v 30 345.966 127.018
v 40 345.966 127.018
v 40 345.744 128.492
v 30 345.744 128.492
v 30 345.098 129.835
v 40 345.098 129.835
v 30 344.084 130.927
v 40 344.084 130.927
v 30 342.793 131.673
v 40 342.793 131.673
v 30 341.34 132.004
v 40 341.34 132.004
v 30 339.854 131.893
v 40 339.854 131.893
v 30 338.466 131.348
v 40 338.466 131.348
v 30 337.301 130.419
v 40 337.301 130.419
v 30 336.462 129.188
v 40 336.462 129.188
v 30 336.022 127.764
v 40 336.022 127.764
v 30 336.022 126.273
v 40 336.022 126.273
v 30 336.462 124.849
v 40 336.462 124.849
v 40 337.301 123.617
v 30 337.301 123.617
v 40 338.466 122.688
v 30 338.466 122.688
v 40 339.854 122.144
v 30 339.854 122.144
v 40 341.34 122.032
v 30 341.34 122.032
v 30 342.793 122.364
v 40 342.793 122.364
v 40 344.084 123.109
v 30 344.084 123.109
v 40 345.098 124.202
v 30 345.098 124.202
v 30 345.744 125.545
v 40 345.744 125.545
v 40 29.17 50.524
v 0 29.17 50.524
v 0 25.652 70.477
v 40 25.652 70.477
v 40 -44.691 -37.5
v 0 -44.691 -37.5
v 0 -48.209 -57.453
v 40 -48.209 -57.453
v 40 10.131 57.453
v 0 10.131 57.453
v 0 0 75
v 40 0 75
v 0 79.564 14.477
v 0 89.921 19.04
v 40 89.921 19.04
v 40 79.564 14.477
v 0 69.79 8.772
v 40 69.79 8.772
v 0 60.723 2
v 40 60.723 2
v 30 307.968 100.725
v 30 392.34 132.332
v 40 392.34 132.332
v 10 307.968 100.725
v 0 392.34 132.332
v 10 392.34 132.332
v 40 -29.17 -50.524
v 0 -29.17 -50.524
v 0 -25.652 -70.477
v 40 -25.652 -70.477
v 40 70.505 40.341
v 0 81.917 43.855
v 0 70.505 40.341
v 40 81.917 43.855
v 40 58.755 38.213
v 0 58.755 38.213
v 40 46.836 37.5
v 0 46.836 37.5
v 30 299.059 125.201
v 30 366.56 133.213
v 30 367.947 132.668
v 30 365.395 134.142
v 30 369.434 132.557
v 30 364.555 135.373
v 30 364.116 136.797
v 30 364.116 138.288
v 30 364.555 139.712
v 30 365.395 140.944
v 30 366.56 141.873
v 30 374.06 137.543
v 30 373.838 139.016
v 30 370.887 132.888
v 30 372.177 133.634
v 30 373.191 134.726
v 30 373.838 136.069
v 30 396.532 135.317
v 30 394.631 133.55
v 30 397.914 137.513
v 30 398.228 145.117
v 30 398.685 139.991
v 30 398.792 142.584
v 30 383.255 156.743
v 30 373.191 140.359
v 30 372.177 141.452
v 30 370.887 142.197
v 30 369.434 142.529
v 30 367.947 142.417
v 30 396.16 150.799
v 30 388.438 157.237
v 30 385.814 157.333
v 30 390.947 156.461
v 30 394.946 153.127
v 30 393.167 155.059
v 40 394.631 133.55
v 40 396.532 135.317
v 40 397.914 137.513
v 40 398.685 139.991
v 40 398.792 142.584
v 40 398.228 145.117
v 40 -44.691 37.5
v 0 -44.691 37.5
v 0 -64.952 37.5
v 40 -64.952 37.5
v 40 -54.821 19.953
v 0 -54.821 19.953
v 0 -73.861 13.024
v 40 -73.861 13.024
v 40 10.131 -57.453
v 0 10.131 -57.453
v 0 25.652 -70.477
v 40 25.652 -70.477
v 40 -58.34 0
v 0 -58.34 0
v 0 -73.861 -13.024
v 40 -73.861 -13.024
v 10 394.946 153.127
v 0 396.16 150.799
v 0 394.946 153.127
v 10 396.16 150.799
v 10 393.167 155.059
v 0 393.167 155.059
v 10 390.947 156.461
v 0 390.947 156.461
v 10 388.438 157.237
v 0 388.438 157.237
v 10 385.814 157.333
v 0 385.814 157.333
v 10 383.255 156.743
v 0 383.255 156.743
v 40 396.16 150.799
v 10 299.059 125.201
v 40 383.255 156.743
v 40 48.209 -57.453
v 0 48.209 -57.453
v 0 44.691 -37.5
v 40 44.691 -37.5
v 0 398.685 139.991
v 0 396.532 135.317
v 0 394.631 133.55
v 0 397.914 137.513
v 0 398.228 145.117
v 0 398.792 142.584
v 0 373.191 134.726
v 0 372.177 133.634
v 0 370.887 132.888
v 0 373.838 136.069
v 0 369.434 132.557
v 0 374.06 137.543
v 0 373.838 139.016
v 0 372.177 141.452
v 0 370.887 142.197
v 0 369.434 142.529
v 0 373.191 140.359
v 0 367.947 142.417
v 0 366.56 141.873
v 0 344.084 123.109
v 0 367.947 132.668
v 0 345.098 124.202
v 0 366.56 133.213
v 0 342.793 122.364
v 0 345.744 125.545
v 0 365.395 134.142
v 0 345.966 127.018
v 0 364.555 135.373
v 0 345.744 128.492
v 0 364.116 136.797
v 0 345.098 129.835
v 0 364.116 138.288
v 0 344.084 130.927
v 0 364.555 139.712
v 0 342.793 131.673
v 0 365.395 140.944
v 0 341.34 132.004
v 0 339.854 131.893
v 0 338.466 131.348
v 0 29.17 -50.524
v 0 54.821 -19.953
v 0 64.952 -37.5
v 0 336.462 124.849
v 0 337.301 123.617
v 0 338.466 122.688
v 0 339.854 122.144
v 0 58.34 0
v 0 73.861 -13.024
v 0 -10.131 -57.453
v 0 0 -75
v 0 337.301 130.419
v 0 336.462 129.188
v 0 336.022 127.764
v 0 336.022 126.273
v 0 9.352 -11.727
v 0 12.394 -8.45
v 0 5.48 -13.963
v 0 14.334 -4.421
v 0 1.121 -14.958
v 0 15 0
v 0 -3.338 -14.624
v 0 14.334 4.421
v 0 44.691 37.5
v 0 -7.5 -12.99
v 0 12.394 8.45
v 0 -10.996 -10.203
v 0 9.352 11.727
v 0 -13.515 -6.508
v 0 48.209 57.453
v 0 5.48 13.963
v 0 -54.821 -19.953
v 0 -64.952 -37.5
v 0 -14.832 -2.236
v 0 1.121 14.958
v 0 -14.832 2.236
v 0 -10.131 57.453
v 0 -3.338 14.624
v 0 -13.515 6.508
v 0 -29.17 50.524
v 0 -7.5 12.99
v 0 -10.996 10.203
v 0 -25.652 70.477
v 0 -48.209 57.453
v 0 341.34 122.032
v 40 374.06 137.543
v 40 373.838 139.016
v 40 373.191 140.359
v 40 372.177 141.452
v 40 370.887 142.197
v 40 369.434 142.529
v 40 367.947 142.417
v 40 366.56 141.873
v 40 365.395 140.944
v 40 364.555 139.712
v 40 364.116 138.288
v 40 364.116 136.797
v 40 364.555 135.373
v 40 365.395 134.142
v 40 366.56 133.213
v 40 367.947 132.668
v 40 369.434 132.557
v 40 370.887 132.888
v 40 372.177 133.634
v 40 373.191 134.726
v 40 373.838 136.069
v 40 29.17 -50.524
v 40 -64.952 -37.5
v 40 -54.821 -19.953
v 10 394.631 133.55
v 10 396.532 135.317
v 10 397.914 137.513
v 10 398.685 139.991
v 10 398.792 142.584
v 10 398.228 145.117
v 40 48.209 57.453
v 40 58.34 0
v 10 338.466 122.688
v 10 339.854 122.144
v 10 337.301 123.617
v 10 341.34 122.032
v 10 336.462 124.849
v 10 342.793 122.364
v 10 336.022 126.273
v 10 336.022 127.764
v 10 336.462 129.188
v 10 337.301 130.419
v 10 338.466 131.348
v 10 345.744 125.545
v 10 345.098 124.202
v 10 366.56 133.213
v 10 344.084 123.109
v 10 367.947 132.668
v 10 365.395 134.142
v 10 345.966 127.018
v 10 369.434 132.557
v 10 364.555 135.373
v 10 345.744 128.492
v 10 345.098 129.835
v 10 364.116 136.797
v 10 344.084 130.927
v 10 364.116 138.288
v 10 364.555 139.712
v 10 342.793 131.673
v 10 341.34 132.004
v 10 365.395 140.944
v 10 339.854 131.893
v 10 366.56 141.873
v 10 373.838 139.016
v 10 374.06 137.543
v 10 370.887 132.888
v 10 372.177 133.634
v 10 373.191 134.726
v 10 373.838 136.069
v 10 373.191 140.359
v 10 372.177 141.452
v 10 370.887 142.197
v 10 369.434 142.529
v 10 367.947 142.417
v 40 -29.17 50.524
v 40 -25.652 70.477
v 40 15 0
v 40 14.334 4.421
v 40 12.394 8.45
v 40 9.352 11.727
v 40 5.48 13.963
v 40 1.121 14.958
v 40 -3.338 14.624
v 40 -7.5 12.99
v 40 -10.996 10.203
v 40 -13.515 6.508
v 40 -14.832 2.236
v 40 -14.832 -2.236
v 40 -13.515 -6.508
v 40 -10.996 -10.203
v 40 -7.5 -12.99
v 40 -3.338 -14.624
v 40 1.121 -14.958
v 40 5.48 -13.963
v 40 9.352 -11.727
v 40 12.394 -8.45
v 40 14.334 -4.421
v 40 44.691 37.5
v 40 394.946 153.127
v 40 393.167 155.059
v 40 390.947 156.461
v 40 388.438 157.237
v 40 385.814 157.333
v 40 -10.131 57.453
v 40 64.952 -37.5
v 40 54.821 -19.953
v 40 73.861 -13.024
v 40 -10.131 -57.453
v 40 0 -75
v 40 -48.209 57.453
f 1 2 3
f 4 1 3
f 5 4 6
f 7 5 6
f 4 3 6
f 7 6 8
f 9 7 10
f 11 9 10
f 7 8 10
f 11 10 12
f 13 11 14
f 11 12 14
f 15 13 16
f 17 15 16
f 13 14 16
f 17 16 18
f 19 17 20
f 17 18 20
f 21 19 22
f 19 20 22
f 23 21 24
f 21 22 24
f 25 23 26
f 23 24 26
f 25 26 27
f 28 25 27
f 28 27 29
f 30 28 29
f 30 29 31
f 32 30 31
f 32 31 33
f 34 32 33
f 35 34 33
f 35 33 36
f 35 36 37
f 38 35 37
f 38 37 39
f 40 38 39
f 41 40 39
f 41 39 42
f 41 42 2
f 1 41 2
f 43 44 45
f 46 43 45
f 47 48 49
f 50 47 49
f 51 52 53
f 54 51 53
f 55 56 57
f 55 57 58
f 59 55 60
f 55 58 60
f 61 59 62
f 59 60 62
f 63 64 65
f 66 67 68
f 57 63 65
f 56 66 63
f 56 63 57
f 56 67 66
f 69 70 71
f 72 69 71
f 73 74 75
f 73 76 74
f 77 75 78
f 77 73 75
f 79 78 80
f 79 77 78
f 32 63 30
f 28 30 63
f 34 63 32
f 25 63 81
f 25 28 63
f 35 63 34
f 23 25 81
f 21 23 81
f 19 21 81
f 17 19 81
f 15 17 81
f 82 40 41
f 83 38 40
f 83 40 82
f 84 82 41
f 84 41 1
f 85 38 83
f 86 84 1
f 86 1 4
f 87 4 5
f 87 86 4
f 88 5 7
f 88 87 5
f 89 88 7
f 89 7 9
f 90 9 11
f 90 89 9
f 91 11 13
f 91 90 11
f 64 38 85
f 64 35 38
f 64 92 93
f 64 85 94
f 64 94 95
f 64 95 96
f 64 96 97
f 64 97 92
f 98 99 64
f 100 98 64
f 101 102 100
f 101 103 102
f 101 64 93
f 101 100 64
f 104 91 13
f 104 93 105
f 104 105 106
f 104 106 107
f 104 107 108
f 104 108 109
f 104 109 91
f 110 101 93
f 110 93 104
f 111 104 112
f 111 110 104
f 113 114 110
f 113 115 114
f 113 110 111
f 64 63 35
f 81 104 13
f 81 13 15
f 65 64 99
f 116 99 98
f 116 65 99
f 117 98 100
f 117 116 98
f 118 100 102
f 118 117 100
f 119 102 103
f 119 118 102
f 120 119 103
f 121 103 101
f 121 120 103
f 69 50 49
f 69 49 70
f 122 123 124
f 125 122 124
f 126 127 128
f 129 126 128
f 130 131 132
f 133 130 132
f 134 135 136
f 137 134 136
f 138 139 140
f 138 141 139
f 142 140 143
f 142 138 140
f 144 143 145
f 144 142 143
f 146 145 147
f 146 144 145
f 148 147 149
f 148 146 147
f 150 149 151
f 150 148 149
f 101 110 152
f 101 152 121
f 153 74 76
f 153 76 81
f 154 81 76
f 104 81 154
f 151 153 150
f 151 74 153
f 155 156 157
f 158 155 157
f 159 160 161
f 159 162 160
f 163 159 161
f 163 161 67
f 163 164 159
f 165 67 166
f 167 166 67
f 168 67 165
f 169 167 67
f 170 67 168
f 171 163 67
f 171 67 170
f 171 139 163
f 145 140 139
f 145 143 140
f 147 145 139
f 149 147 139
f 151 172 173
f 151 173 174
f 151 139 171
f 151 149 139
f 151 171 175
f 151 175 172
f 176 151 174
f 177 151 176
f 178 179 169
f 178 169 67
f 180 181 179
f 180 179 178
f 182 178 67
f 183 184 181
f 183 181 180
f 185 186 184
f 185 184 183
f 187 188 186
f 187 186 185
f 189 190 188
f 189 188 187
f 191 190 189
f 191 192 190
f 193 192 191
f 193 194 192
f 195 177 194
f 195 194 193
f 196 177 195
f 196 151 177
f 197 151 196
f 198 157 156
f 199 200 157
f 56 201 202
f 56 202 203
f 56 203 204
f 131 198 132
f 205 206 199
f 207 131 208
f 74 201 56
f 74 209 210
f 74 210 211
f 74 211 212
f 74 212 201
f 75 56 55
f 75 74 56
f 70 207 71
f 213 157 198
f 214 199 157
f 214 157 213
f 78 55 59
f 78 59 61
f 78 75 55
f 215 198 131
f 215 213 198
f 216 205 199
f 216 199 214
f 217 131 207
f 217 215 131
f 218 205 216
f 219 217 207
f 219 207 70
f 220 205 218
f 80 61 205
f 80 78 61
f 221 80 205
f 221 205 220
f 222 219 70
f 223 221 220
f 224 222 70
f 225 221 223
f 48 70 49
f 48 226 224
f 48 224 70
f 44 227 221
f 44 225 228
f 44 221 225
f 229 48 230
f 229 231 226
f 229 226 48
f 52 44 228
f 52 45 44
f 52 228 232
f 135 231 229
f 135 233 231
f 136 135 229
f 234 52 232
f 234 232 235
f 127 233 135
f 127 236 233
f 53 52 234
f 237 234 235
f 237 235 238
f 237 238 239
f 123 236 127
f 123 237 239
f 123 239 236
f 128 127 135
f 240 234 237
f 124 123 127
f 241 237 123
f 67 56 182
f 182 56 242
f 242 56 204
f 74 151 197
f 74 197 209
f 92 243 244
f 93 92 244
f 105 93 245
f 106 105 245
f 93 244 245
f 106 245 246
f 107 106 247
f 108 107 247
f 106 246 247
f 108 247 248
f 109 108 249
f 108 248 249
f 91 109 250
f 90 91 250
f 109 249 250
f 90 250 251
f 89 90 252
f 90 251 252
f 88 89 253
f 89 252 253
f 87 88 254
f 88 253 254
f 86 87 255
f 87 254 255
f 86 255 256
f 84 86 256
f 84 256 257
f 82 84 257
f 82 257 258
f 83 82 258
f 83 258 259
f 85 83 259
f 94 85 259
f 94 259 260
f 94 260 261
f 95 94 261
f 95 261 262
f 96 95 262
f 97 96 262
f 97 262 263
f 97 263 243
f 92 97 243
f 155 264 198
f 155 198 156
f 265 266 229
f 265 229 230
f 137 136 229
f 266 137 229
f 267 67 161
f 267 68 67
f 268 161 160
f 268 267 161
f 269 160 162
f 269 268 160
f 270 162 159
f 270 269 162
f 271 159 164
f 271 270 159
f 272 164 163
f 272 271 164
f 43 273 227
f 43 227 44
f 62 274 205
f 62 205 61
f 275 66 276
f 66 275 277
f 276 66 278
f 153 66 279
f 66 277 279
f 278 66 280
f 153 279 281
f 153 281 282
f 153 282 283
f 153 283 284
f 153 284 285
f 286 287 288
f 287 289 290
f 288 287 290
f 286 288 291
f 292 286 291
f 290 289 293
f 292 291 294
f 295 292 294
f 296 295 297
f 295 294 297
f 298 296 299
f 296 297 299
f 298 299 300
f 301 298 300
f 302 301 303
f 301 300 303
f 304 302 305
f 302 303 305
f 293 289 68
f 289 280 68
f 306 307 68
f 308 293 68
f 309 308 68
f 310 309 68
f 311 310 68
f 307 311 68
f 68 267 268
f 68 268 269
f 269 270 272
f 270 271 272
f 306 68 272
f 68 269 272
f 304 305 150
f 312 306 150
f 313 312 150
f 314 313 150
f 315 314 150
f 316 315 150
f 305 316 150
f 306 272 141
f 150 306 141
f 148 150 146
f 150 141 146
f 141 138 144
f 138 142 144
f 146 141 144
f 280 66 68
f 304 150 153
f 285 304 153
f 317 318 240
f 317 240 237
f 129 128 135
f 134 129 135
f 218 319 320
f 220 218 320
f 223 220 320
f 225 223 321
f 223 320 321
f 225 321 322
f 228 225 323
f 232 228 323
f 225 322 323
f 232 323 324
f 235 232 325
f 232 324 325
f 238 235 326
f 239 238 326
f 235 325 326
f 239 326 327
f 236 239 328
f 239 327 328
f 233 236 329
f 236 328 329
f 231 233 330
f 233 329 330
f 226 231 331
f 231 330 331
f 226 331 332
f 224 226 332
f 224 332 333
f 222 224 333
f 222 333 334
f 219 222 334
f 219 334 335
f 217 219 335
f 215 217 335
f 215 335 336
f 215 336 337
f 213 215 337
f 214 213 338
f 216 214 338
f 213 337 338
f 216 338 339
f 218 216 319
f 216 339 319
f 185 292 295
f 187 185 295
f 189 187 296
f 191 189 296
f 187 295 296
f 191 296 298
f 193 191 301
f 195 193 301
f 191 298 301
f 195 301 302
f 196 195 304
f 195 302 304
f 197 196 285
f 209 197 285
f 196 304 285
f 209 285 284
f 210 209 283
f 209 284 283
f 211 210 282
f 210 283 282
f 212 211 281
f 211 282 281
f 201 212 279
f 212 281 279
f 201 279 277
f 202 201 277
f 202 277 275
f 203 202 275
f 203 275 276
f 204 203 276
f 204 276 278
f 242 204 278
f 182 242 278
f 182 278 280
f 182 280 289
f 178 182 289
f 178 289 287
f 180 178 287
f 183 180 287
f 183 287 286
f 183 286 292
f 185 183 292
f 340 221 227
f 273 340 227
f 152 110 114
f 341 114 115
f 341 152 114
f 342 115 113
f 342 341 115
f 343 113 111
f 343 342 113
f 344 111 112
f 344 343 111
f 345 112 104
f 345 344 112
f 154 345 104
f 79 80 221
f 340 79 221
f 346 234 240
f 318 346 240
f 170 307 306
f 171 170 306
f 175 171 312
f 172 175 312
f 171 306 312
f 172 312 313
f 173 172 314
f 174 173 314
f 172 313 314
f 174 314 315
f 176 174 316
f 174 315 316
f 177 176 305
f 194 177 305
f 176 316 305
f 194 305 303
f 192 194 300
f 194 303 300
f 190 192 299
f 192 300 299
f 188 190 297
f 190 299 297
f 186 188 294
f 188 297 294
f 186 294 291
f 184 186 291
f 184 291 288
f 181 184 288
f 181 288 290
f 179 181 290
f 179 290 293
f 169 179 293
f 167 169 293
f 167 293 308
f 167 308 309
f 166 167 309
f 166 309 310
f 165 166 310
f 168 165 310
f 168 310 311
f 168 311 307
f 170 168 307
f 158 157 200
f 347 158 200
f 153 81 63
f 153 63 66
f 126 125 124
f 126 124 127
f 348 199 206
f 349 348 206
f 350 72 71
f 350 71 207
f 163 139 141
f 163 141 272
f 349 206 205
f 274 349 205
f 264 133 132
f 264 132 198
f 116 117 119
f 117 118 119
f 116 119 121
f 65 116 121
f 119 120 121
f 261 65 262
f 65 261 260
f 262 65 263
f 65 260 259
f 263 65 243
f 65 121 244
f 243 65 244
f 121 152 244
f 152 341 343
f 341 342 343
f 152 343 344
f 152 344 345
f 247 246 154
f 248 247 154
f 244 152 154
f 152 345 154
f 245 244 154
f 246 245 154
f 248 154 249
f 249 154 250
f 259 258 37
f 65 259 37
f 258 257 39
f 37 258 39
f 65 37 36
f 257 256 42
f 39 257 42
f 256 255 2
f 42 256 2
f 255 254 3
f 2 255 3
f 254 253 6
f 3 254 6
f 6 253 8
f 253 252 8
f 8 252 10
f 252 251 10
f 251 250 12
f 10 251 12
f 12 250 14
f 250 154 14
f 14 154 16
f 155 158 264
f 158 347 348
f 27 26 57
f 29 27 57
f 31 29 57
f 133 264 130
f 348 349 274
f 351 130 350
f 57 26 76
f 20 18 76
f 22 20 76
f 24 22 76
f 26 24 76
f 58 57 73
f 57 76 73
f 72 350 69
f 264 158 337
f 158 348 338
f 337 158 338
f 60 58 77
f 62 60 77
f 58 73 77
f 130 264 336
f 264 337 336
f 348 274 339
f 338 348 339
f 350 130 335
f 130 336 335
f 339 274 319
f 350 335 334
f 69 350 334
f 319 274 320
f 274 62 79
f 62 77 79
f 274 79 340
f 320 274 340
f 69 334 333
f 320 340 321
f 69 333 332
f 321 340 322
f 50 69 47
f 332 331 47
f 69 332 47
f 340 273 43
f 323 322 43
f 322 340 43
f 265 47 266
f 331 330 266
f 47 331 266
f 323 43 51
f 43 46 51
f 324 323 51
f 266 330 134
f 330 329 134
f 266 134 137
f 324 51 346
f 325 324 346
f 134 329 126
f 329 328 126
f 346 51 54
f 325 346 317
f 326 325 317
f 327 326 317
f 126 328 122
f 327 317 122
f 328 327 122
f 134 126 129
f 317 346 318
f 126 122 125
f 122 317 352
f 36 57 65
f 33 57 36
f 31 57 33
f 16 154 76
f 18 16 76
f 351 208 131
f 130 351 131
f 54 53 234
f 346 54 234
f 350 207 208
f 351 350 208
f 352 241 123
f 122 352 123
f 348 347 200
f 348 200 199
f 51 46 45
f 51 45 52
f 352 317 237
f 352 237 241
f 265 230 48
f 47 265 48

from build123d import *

# Parameters (mm, degrees)
F0_R      = 15
F1_DEPTH  = 40
F2_R      = 15
F3_DEPTH  = 40
F5_DEPTH  = 40
F8_DEPTH  = 40
F9_R      = 100
F10_W     = 20
F10_H     = 46.3822901116
F11_DEPTH = 100
F12_R     = 10
F14_D     = 10
F14_DEPTH = 100
F14_TIP   = 3.0043030951


with BuildPart() as f1:
    # F0 (on Right) → F1 (new body)
    with BuildSketch(Plane.YZ):
        with BuildLine():
            ThreePointArc((36.930290586, -6.5118075241), (37.3573011403, -3.2683407888), (37.5, 0))
            ThreePointArc((37.5, 0), (37.3573011695, 3.2683404555), (36.9302907022, 6.5118068652))
            ThreePointArc((36.9302907022, 6.5118068652), (35.2384733576, 12.8257551601), (32.4759529732, 18.7499994261))
            ThreePointArc((32.4759529732, 18.7499994261), (28.7266668337, 24.104535105), (24.1045353722, 28.7266666095))
            ThreePointArc((24.1045353722, 28.7266666095), (18.7500010733, 32.4759520223), (12.8257576929, 35.2384724357))
            ThreePointArc((12.8257576929, 35.2384724357), (6.5118078361, 36.930290531), (-8.36e-08, 37.5))
            ThreePointArc((-8.36e-08, 37.5), (-6.5118082765, 36.9302904534), (-12.8257583762, 35.238472187))
            ThreePointArc((-12.8257583762, 35.238472187), (-18.750001471, 32.4759517926), (-24.1045355188, 28.7266664865))
            ThreePointArc((-24.1045355188, 28.7266664865), (-28.7266663856, 24.1045356389), (-32.4759521805, 18.7500007991))
            ThreePointArc((-32.4759521805, 18.7500007991), (-35.2384728502, 12.825756554), (-36.9302904623, 6.5118082256))
            ThreePointArc((-36.9302904623, 6.5118082256), (-37.5, 9.85e-07), (-36.9302908044, -6.5118062856))
            ThreePointArc((-36.9302908044, -6.5118062856), (-35.2384734144, -12.8257550039), (-32.4759528451, -18.749999648))
            ThreePointArc((-32.4759528451, -18.749999648), (-28.7266670967, -24.1045347915), (-24.1045361954, -28.7266659187))
            ThreePointArc((-24.1045361954, -28.7266659187), (-18.7500019131, -32.4759515374), (-12.8257585056, -35.2384721399))
            ThreePointArc((-12.8257585056, -35.2384721399), (-6.5118083601, -36.9302904386), (-1.157e-07, -37.5))
            ThreePointArc((-1.157e-07, -37.5), (6.5118084282, -36.9302904266), (12.8257588531, -35.2384720135))
            ThreePointArc((12.8257588531, -35.2384720135), (18.7500017771, -32.4759516159), (24.1045356715, -28.7266663583))
            ThreePointArc((24.1045356715, -28.7266663583), (28.7266671728, -24.1045347008), (32.4759533055, -18.7499988506))
            ThreePointArc((32.4759533055, -18.7499988506), (35.2384733568, -12.8257551622), (36.930290586, -6.5118075241))
        make_face()
        Circle(F0_R, mode=Mode.SUBTRACT)
        Circle(F0_R)
        Polygon((-54.8213325031, 19.9533332339), (-42.3943453068, 24.476386675), (-44.6907597223, 37.5), (-64.9519052838, 37.5), align=None)
        Polygon((-44.6907597223, 37.5), (-31.4662361691, 37.5), (-29.1698217536, 50.523613325), (-48.2090707265, 57.4533332339), align=None)
        Polygon((29.1698217536, 50.523613325), (31.4662361691, 37.5), (44.6907597223, 37.5), (48.2090707265, 57.4533332339), align=None)
        Polygon((44.6907597223, 37.5), (42.3943453068, 24.476386675), (54.8213325031, 19.9533332339), (64.9519052838, 37.5), align=None)
        Polygon((54.8213325031, 19.9533332339), (48.2090707265, 8.500559884), (58.3396435073, 0), (73.8605814759, 13.023613325), align=None)
        Polygon((29.1698217536, -50.523613325), (16.7428345573, -46.000559884), (10.1305727808, -57.4533332339), (25.6515107494, -70.4769465589), align=None)
        Polygon((10.1305727808, -57.4533332339), (0, -48.95277335), (-10.1305727808, -57.4533332339), (0, -75), align=None)
        Polygon((-10.1305727808, -57.4533332339), (-16.7428345573, -46.000559884), (-29.1698217536, -50.523613325), (-25.6515107494, -70.4769465589), align=None)
        Polygon((-58.3396435073, 0), (-48.2090707265, 8.500559884), (-54.8213325031, 19.9533332339), (-73.8605814759, 13.023613325), align=None)
        Polygon((-29.1698217536, 50.523613325), (-16.7428345573, 46.000559884), (-10.1305727808, 57.4533332339), (-25.6515107494, 70.4769465589), align=None)
        Polygon((-10.1305727808, 57.4533332339), (0, 48.95277335), (10.1305727808, 57.4533332339), (0, 75), align=None)
        Polygon((58.3396435073, 0), (48.2090707265, -8.500559884), (54.8213325031, -19.9533332339), (73.8605814759, -13.023613325), align=None)
        Polygon((54.8213325031, -19.9533332339), (42.3943453068, -24.476386675), (44.6907597223, -37.5), (64.9519052838, -37.5), align=None)
        Polygon((-29.1698217536, -50.523613325), (-31.4662361691, -37.5), (-44.6907597223, -37.5), (-48.2090707265, -57.4533332339), align=None)
        Polygon((-44.6907597223, -37.5), (-42.3943453068, -24.476386675), (-54.8213325031, -19.9533332339), (-64.9519052838, -37.5), align=None)
        Polygon((44.6907597223, -37.5), (31.4662361691, -37.5), (29.1698217536, -50.523613325), (48.2090707265, -57.4533332339), align=None)
        Polygon((-54.8213325031, -19.9533332339), (-48.2090707265, -8.500559884), (-58.3396435073, 0), (-73.8605814759, -13.023613325), align=None)
        Polygon((10.1305727808, 57.4533332339), (16.7428345573, 46.000559884), (29.1698217536, 50.523613325), (25.6515107494, 70.4769465589), align=None)
        Polygon((-42.3943453068, 24.476386675), (-33.1706974084, 27.8335199613), (-31.4662361691, 37.5), (-44.6907597223, 37.5), align=None)
        Polygon((-31.4662361691, 37.5), (-21.6506350946, 37.5), (-16.7428345573, 46.000559884), (-29.1698217536, 50.523613325), align=None)
        Polygon((16.7428345573, 46.000559884), (21.6506350946, 37.5), (31.4662361691, 37.5), (29.1698217536, 50.523613325), align=None)
        Polygon((31.4662361691, 37.5), (33.1706974084, 27.8335199613), (42.3943453068, 24.476386675), (44.6907597223, 37.5), align=None)
        Polygon((42.3943453068, 24.476386675), (40.6898840675, 14.8099066363), (48.2090707265, 8.500559884), (54.8213325031, 19.9533332339), align=None)
        Polygon((48.2090707265, 8.500559884), (43.3012701892, 0), (48.2090707265, -8.500559884), (58.3396435073, 0), align=None)
        Polygon((31.4662361691, -37.5), (21.6506350946, -37.5), (16.7428345573, -46.000559884), (29.1698217536, -50.523613325), align=None)
        Polygon((16.7428345573, -46.000559884), (7.519186659, -42.6434265976), (0, -48.95277335), (10.1305727808, -57.4533332339), align=None)
        Polygon((0, -48.95277335), (-7.519186659, -42.6434265976), (-16.7428345573, -46.000559884), (-10.1305727808, -57.4533332339), align=None)
        Polygon((-16.7428345573, -46.000559884), (-21.6506350946, -37.5), (-31.4662361691, -37.5), (-29.1698217536, -50.523613325), align=None)
        Polygon((-48.2090707265, -8.500559884), (-43.3012701892, 0), (-48.2090707265, 8.500559884), (-58.3396435073, 0), align=None)
        Polygon((-48.2090707265, 8.500559884), (-40.6898840675, 14.8099066363), (-42.3943453068, 24.476386675), (-54.8213325031, 19.9533332339), align=None)
        Polygon((-16.7428345573, 46.000559884), (-7.519186659, 42.6434265976), (0, 48.95277335), (-10.1305727808, 57.4533332339), align=None)
        Polygon((0, 48.95277335), (7.519186659, 42.6434265976), (16.7428345573, 46.000559884), (10.1305727808, 57.4533332339), align=None)
        Polygon((48.2090707265, -8.500559884), (40.6898840675, -14.8099066363), (42.3943453068, -24.476386675), (54.8213325031, -19.9533332339), align=None)
        Polygon((42.3943453068, -24.476386675), (33.1706974084, -27.8335199613), (31.4662361691, -37.5), (44.6907597223, -37.5), align=None)
        Polygon((-31.4662361691, -37.5), (-33.1706974084, -27.8335199613), (-42.3943453068, -24.476386675), (-44.6907597223, -37.5), align=None)
        Polygon((-42.3943453068, -24.476386675), (-40.6898840675, -14.8099066363), (-48.2090707265, -8.500559884), (-54.8213325031, -19.9533332339), align=None)
        Polygon((-40.6898840675, 14.8099066363), (-34.5601869415, 19.9533332339), (-33.1706974084, 27.8335199613), (-42.3943453068, 24.476386675), align=None)
        Polygon((-7.519186659, -42.6434265976), (-13.648883785, -37.5), (-21.6506350946, -37.5), (-16.7428345573, -46.000559884), align=None)
        Polygon((43.3012701892, 0), (39.3003945344, -6.9297199089), (40.6898840675, -14.8099066363), (48.2090707265, -8.500559884), align=None)
        Polygon((-33.1706974084, 27.8335199613), (-25.6515107494, 30.5702800911), (-21.6506350946, 37.5), (-31.4662361691, 37.5), align=None)
        Polygon((40.6898840675, -14.8099066363), (34.5601869415, -19.9533332339), (33.1706974084, -27.8335199613), (42.3943453068, -24.476386675), align=None)
        Polygon((-21.6506350946, 37.5), (-13.648883785, 37.5), (-7.519186659, 42.6434265976), (-16.7428345573, 46.000559884), align=None)
        Polygon((33.1706974084, 27.8335199613), (34.5601869415, 19.9533332339), (40.6898840675, 14.8099066363), (42.3943453068, 24.476386675), align=None)
        Polygon((-33.1706974084, -27.8335199613), (-34.5601869415, -19.9533332339), (-40.6898840675, -14.8099066363), (-42.3943453068, -24.476386675), align=None)
        Polygon((21.6506350946, 37.5), (25.6515107494, 30.5702800911), (33.1706974084, 27.8335199613), (31.4662361691, 37.5), align=None)
        Polygon((7.519186659, 42.6434265976), (13.648883785, 37.5), (21.6506350946, 37.5), (16.7428345573, 46.000559884), align=None)
        Polygon((40.6898840675, 14.8099066363), (39.3003945344, 6.9297199089), (43.3012701892, 0), (48.2090707265, 8.500559884), align=None)
        Polygon((-21.6506350946, -37.5), (-25.6515107494, -30.5702800911), (-33.1706974084, -27.8335199613), (-31.4662361691, -37.5), align=None)
        Polygon((7.519186659, -42.6434265976), (0, -39.9066664678), (-7.519186659, -42.6434265976), (0, -48.95277335), align=None)
        Polygon((-7.519186659, 42.6434265976), (0, 39.9066664678), (7.519186659, 42.6434265976), (0, 48.95277335), align=None)
        Polygon((33.1706974084, -27.8335199613), (25.6515107494, -30.5702800911), (21.6506350946, -37.5), (31.4662361691, -37.5), align=None)
        Polygon((-40.6898840675, -14.8099066363), (-39.3003945344, -6.9297199089), (-43.3012701892, 0), (-48.2090707265, -8.500559884), align=None)
        Polygon((21.6506350946, -37.5), (13.648883785, -37.5), (7.519186659, -42.6434265976), (16.7428345573, -46.000559884), align=None)
        Polygon((-43.3012701892, 0), (-39.3003945344, 6.9297199089), (-40.6898840675, 14.8099066363), (-48.2090707265, 8.500559884), align=None)
        Polygon((0, 39.9066664678), (6.6122617766, 37.5), (13.648883785, 37.5), (7.519186659, 42.6434265976), align=None)
        Polygon((34.5601869415, 19.9533332339), (35.7820835302, 13.023613325), (39.3003945344, 6.9297199089), (40.6898840675, 14.8099066363), align=None)
        Polygon((0, -39.9066664678), (-6.6122617766, -37.5), (-13.648883785, -37.5), (-7.519186659, -42.6434265976), align=None)
        Polygon((39.3003945344, -6.9297199089), (35.7820835302, -13.023613325), (34.5601869415, -19.9533332339), (40.6898840675, -14.8099066363), align=None)
        Polygon((-39.3003945344, -6.9297199089), (-38.0784979457, 0), (-39.3003945344, 6.9297199089), (-43.3012701892, 0), align=None)
        Polygon((-34.5601869415, -19.9533332339), (-35.7820835302, -13.023613325), (-39.3003945344, -6.9297199089), (-40.6898840675, -14.8099066363), align=None)
        Polygon((-13.648883785, -37.5), (-19.0392489729, -32.9769465589), (-25.6515107494, -30.5702800911), (-21.6506350946, -37.5), align=None)
        Polygon((34.5601869415, -19.9533332339), (29.1698217536, -24.476386675), (25.6515107494, -30.5702800911), (33.1706974084, -27.8335199613), align=None)
        Polygon((-34.5601869415, 19.9533332339), (-29.1698217536, 24.476386675), (-25.6515107494, 30.5702800911), (-33.1706974084, 27.8335199613), align=None)
        Polygon((-25.6515107494, 30.5702800911), (-19.0392489729, 32.9769465589), (-13.648883785, 37.5), (-21.6506350946, 37.5), align=None)
        Polygon((-39.3003945344, 6.9297199089), (-35.7820835302, 13.023613325), (-34.5601869415, 19.9533332339), (-40.6898840675, 14.8099066363), align=None)
        Polygon((25.6515107494, 30.5702800911), (29.1698217536, 24.476386675), (34.5601869415, 19.9533332339), (33.1706974084, 27.8335199613), align=None)
        Polygon((-25.6515107494, -30.5702800911), (-29.1698217536, -24.476386675), (-34.5601869415, -19.9533332339), (-33.1706974084, -27.8335199613), align=None)
        Polygon((25.6515107494, -30.5702800911), (19.0392489729, -32.9769465589), (13.648883785, -37.5), (21.6506350946, -37.5), align=None)
        Polygon((-13.648883785, 37.5), (-6.6122617766, 37.5), (0, 39.9066664678), (-7.519186659, 42.6434265976), align=None)
        Polygon((13.648883785, -37.5), (6.6122617766, -37.5), (0, -39.9066664678), (7.519186659, -42.6434265976), align=None)
        Polygon((39.3003945344, 6.9297199089), (38.0784979457, 0), (39.3003945344, -6.9297199089), (43.3012701892, 0), align=None)
        Polygon((13.648883785, 37.5), (19.0392489729, 32.9769465589), (25.6515107494, 30.5702800911), (21.6506350946, 37.5), align=None)
        Polygon((35.7820835302, -13.023613325), (32.4759533055, -18.7499988506), (29.1698217536, -24.476386675), (34.5601869415, -19.9533332339), align=None)
        Polygon((29.1698217536, -24.476386675), (24.1045356715, -28.7266663583), (19.0392489729, -32.9769465589), (25.6515107494, -30.5702800911), align=None)
        Polygon((-29.1698217536, -24.476386675), (-32.4759528451, -18.749999648), (-35.7820835302, -13.023613325), (-34.5601869415, -19.9533332339), align=None)
        Polygon((-6.6122617766, -37.5), (-12.8257585056, -35.2384721399), (-19.0392489729, -32.9769465589), (-13.648883785, -37.5), align=None)
        Polygon((-35.7820835302, 13.023613325), (-32.4759521805, 18.7500007991), (-29.1698217536, 24.476386675), (-34.5601869415, 19.9533332339), align=None)
        Polygon((38.0784979457, 0), (36.930290586, -6.5118075241), (35.7820835302, -13.023613325), (39.3003945344, -6.9297199089), align=None)
        Polygon((29.1698217536, 24.476386675), (32.4759529732, 18.7499994261), (35.7820835302, 13.023613325), (34.5601869415, 19.9533332339), align=None)
        Polygon((-19.0392489729, 32.9769465589), (-12.8257583762, 35.238472187), (-6.6122617766, 37.5), (-13.648883785, 37.5), align=None)
        Polygon((6.6122617766, 37.5), (12.8257576929, 35.2384724357), (19.0392489729, 32.9769465589), (13.648883785, 37.5), align=None)
        Polygon((-38.0784979457, 0), (-36.9302904623, 6.5118082256), (-35.7820835302, 13.023613325), (-39.3003945344, 6.9297199089), align=None)
        Polygon((-29.1698217536, 24.476386675), (-24.1045355188, 28.7266664865), (-19.0392489729, 32.9769465589), (-25.6515107494, 30.5702800911), align=None)
        Polygon((-19.0392489729, -32.9769465589), (-24.1045361954, -28.7266659187), (-29.1698217536, -24.476386675), (-25.6515107494, -30.5702800911), align=None)
        Polygon((35.7820835302, 13.023613325), (36.9302907022, 6.5118068652), (38.0784979457, 0), (39.3003945344, 6.9297199089), align=None)
        Polygon((-35.7820835302, -13.023613325), (-36.9302908044, -6.5118062856), (-38.0784979457, 0), (-39.3003945344, -6.9297199089), align=None)
        Polygon((19.0392489729, -32.9769465589), (12.8257588531, -35.2384720135), (6.6122617766, -37.5), (13.648883785, -37.5), align=None)
        Polygon((19.0392489729, 32.9769465589), (24.1045353722, 28.7266666095), (29.1698217536, 24.476386675), (25.6515107494, 30.5702800911), align=None)
        Polygon((-6.6122617766, 37.5), (-8.36e-08, 37.5), (6.6122617766, 37.5), (0, 39.9066664678), align=None)
        Polygon((6.6122617766, -37.5), (-1.157e-07, -37.5), (-6.6122617766, -37.5), (0, -39.9066664678), align=None)
        with BuildLine():
            ThreePointArc((36.9302907022, 6.5118068652), (37.3573011695, 3.2683404555), (37.5, 0))
            ThreePointArc((37.5, 0), (37.3573011403, -3.2683407888), (36.930290586, -6.5118075241))
            Line((36.930290586, -6.5118075241), (38.0784979457, 0))
            Line((38.0784979457, 0), (36.9302907022, 6.5118068652))
        make_face()
        with BuildLine():
            Line((35.7820835302, -13.023613325), (36.930290586, -6.5118075241))
            ThreePointArc((36.930290586, -6.5118075241), (35.2384733568, -12.8257551622), (32.4759533055, -18.7499988506))
            Line((32.4759533055, -18.7499988506), (35.7820835302, -13.023613325))
        make_face()
        with BuildLine():
            ThreePointArc((-12.8257583762, 35.238472187), (-6.5118082765, 36.9302904534), (-8.36e-08, 37.5))
            Line((-8.36e-08, 37.5), (-6.6122617766, 37.5))
            Line((-6.6122617766, 37.5), (-12.8257583762, 35.238472187))
        make_face()
        with BuildLine():
            ThreePointArc((24.1045353722, 28.7266666095), (28.7266668337, 24.104535105), (32.4759529732, 18.7499994261))
            Line((32.4759529732, 18.7499994261), (29.1698217536, 24.476386675))
            Line((29.1698217536, 24.476386675), (24.1045353722, 28.7266666095))
        make_face()
        with BuildLine():
            ThreePointArc((-36.9302908044, -6.5118062856), (-37.5, 9.85e-07), (-36.9302904623, 6.5118082256))
            Line((-36.9302904623, 6.5118082256), (-38.0784979457, 0))
            Line((-38.0784979457, 0), (-36.9302908044, -6.5118062856))
        make_face()
        with BuildLine():
            Line((-19.0392489729, -32.9769465589), (-12.8257585056, -35.2384721399))
            ThreePointArc((-12.8257585056, -35.2384721399), (-18.7500019131, -32.4759515374), (-24.1045361954, -28.7266659187))
            Line((-24.1045361954, -28.7266659187), (-19.0392489729, -32.9769465589))
        make_face()
        with BuildLine():
            ThreePointArc((-36.9302904623, 6.5118082256), (-35.2384728502, 12.825756554), (-32.4759521805, 18.7500007991))
            Line((-32.4759521805, 18.7500007991), (-35.7820835302, 13.023613325))
            Line((-35.7820835302, 13.023613325), (-36.9302904623, 6.5118082256))
        make_face()
        with BuildLine():
            ThreePointArc((-8.36e-08, 37.5), (6.5118078361, 36.930290531), (12.8257576929, 35.2384724357))
            Line((12.8257576929, 35.2384724357), (6.6122617766, 37.5))
            Line((6.6122617766, 37.5), (-8.36e-08, 37.5))
        make_face()
        with BuildLine():
            Line((-6.6122617766, -37.5), (-1.157e-07, -37.5))
            ThreePointArc((-1.157e-07, -37.5), (-6.5118083601, -36.9302904386), (-12.8257585056, -35.2384721399))
            Line((-12.8257585056, -35.2384721399), (-6.6122617766, -37.5))
        make_face()
        with BuildLine():
            Line((19.0392489729, -32.9769465589), (24.1045356715, -28.7266663583))
            ThreePointArc((24.1045356715, -28.7266663583), (18.7500017771, -32.4759516159), (12.8257588531, -35.2384720135))
            Line((12.8257588531, -35.2384720135), (19.0392489729, -32.9769465589))
        make_face()
        with BuildLine():
            ThreePointArc((-32.4759521805, 18.7500007991), (-28.7266663856, 24.1045356389), (-24.1045355188, 28.7266664865))
            Line((-24.1045355188, 28.7266664865), (-29.1698217536, 24.476386675))
            Line((-29.1698217536, 24.476386675), (-32.4759521805, 18.7500007991))
        make_face()
        with BuildLine():
            Line((-29.1698217536, -24.476386675), (-24.1045361954, -28.7266659187))
            ThreePointArc((-24.1045361954, -28.7266659187), (-28.7266670967, -24.1045347915), (-32.4759528451, -18.749999648))
            Line((-32.4759528451, -18.749999648), (-29.1698217536, -24.476386675))
        make_face()
        with BuildLine():
            ThreePointArc((32.4759529732, 18.7499994261), (35.2384733576, 12.8257551601), (36.9302907022, 6.5118068652))
            Line((36.9302907022, 6.5118068652), (35.7820835302, 13.023613325))
            Line((35.7820835302, 13.023613325), (32.4759529732, 18.7499994261))
        make_face()
        with BuildLine():
            Line((-35.7820835302, -13.023613325), (-32.4759528451, -18.749999648))
            ThreePointArc((-32.4759528451, -18.749999648), (-35.2384734144, -12.8257550039), (-36.9302908044, -6.5118062856))
            Line((-36.9302908044, -6.5118062856), (-35.7820835302, -13.023613325))
        make_face()
        with BuildLine():
            Line((29.1698217536, -24.476386675), (32.4759533055, -18.7499988506))
            ThreePointArc((32.4759533055, -18.7499988506), (28.7266671728, -24.1045347008), (24.1045356715, -28.7266663583))
            Line((24.1045356715, -28.7266663583), (29.1698217536, -24.476386675))
        make_face()
        with BuildLine():
            Line((6.6122617766, -37.5), (12.8257588531, -35.2384720135))
            ThreePointArc((12.8257588531, -35.2384720135), (6.5118084282, -36.9302904266), (-1.157e-07, -37.5))
            Line((-1.157e-07, -37.5), (6.6122617766, -37.5))
        make_face()
        with BuildLine():
            ThreePointArc((12.8257576929, 35.2384724357), (18.7500010733, 32.4759520223), (24.1045353722, 28.7266666095))
            Line((24.1045353722, 28.7266666095), (19.0392489729, 32.9769465589))
            Line((19.0392489729, 32.9769465589), (12.8257576929, 35.2384724357))
        make_face()
        with BuildLine():
            ThreePointArc((-24.1045355188, 28.7266664865), (-18.750001471, 32.4759517926), (-12.8257583762, 35.238472187))
            Line((-12.8257583762, 35.238472187), (-19.0392489729, 32.9769465589))
            Line((-19.0392489729, 32.9769465589), (-24.1045355188, 28.7266664865))
        make_face()
    extrude(amount=F1_DEPTH)

    # F2 (on face) → F3 (cut)
    with BuildSketch(Plane.YZ.offset(40)):
        Circle(F2_R)
    extrude(amount=-F3_DEPTH, mode=Mode.SUBTRACT)

    # F7 (on face) → F8 (join)
    with BuildSketch(Plane(origin=(0, 0, 0), x_dir=(0, -1, 0), z_dir=(-1, 0, 0))):
        Polygon((-401.6167132327, 135.8076436214), (-73.8605814759, 13.023613325), (-54.8213325031, 19.9533332339), (-64.9519052838, 37.5), (-392.7080370406, 160.2840302964), align=None)
    extrude(amount=-F8_DEPTH)

    # F9
    f9_edges = [f1.edges().sort_by_distance(p)[0] for p in [
        (20, 64.951905, 37.5),
        (20, 73.860581, 13.023613),
    ]]
    fillet(f9_edges, radius=F9_R)

    # F10 (on face) → F11 (cut)
    with BuildSketch(Plane(origin=(0, 398.2842176444, 144.9636000006), x_dir=(-1, 0, 0), z_dir=(0, 0.9396926208, 0.3420201433))):
        with Locations((-20, 2.3612082005)):
            Rectangle(F10_W, F10_H)
    extrude(amount=-F11_DEPTH, mode=Mode.SUBTRACT)

    # F12
    f12_edges = [f1.edges().sort_by_distance(p)[0] for p in [
        (5, 401.616713, 135.807644),
        (35, 401.616713, 135.807644),
        (35, 392.708037, 160.28403),
        (5, 392.708037, 160.28403),
    ]]
    fillet(f12_edges, radius=F12_R)

    # F14
    with Locations(Plane(origin=(0, 0, 0), x_dir=(0, -1, 0), z_dir=(-1, 0, 0))):
        with Locations((-369.0598776945, 137.5426821066), (-340.9664949725, 127.0183366527)):
            Hole(F14_D / 2, depth=F14_DEPTH)
            with Locations((0, 0, -(F14_DEPTH + F14_TIP / 2))):  # 118° drill point
                Cone(0, F14_D / 2, F14_TIP, mode=Mode.SUBTRACT)


with BuildPart() as f5:
    # F4 (on face) → F5 (new body)
    with BuildSketch(Plane(origin=(0, 0, 0), x_dir=(0, -1, 0), z_dir=(-1, 0, 0))):
        Polygon((-89.1483277082, 42.2865301371), (-54.8213325031, 19.9533332339), (-64.9519052838, 37.5), (-44.6907597223, 37.5), (-77.9467773267, 59.5037502201), align=None)
    extrude(amount=-F5_DEPTH)


solid = f1.part
